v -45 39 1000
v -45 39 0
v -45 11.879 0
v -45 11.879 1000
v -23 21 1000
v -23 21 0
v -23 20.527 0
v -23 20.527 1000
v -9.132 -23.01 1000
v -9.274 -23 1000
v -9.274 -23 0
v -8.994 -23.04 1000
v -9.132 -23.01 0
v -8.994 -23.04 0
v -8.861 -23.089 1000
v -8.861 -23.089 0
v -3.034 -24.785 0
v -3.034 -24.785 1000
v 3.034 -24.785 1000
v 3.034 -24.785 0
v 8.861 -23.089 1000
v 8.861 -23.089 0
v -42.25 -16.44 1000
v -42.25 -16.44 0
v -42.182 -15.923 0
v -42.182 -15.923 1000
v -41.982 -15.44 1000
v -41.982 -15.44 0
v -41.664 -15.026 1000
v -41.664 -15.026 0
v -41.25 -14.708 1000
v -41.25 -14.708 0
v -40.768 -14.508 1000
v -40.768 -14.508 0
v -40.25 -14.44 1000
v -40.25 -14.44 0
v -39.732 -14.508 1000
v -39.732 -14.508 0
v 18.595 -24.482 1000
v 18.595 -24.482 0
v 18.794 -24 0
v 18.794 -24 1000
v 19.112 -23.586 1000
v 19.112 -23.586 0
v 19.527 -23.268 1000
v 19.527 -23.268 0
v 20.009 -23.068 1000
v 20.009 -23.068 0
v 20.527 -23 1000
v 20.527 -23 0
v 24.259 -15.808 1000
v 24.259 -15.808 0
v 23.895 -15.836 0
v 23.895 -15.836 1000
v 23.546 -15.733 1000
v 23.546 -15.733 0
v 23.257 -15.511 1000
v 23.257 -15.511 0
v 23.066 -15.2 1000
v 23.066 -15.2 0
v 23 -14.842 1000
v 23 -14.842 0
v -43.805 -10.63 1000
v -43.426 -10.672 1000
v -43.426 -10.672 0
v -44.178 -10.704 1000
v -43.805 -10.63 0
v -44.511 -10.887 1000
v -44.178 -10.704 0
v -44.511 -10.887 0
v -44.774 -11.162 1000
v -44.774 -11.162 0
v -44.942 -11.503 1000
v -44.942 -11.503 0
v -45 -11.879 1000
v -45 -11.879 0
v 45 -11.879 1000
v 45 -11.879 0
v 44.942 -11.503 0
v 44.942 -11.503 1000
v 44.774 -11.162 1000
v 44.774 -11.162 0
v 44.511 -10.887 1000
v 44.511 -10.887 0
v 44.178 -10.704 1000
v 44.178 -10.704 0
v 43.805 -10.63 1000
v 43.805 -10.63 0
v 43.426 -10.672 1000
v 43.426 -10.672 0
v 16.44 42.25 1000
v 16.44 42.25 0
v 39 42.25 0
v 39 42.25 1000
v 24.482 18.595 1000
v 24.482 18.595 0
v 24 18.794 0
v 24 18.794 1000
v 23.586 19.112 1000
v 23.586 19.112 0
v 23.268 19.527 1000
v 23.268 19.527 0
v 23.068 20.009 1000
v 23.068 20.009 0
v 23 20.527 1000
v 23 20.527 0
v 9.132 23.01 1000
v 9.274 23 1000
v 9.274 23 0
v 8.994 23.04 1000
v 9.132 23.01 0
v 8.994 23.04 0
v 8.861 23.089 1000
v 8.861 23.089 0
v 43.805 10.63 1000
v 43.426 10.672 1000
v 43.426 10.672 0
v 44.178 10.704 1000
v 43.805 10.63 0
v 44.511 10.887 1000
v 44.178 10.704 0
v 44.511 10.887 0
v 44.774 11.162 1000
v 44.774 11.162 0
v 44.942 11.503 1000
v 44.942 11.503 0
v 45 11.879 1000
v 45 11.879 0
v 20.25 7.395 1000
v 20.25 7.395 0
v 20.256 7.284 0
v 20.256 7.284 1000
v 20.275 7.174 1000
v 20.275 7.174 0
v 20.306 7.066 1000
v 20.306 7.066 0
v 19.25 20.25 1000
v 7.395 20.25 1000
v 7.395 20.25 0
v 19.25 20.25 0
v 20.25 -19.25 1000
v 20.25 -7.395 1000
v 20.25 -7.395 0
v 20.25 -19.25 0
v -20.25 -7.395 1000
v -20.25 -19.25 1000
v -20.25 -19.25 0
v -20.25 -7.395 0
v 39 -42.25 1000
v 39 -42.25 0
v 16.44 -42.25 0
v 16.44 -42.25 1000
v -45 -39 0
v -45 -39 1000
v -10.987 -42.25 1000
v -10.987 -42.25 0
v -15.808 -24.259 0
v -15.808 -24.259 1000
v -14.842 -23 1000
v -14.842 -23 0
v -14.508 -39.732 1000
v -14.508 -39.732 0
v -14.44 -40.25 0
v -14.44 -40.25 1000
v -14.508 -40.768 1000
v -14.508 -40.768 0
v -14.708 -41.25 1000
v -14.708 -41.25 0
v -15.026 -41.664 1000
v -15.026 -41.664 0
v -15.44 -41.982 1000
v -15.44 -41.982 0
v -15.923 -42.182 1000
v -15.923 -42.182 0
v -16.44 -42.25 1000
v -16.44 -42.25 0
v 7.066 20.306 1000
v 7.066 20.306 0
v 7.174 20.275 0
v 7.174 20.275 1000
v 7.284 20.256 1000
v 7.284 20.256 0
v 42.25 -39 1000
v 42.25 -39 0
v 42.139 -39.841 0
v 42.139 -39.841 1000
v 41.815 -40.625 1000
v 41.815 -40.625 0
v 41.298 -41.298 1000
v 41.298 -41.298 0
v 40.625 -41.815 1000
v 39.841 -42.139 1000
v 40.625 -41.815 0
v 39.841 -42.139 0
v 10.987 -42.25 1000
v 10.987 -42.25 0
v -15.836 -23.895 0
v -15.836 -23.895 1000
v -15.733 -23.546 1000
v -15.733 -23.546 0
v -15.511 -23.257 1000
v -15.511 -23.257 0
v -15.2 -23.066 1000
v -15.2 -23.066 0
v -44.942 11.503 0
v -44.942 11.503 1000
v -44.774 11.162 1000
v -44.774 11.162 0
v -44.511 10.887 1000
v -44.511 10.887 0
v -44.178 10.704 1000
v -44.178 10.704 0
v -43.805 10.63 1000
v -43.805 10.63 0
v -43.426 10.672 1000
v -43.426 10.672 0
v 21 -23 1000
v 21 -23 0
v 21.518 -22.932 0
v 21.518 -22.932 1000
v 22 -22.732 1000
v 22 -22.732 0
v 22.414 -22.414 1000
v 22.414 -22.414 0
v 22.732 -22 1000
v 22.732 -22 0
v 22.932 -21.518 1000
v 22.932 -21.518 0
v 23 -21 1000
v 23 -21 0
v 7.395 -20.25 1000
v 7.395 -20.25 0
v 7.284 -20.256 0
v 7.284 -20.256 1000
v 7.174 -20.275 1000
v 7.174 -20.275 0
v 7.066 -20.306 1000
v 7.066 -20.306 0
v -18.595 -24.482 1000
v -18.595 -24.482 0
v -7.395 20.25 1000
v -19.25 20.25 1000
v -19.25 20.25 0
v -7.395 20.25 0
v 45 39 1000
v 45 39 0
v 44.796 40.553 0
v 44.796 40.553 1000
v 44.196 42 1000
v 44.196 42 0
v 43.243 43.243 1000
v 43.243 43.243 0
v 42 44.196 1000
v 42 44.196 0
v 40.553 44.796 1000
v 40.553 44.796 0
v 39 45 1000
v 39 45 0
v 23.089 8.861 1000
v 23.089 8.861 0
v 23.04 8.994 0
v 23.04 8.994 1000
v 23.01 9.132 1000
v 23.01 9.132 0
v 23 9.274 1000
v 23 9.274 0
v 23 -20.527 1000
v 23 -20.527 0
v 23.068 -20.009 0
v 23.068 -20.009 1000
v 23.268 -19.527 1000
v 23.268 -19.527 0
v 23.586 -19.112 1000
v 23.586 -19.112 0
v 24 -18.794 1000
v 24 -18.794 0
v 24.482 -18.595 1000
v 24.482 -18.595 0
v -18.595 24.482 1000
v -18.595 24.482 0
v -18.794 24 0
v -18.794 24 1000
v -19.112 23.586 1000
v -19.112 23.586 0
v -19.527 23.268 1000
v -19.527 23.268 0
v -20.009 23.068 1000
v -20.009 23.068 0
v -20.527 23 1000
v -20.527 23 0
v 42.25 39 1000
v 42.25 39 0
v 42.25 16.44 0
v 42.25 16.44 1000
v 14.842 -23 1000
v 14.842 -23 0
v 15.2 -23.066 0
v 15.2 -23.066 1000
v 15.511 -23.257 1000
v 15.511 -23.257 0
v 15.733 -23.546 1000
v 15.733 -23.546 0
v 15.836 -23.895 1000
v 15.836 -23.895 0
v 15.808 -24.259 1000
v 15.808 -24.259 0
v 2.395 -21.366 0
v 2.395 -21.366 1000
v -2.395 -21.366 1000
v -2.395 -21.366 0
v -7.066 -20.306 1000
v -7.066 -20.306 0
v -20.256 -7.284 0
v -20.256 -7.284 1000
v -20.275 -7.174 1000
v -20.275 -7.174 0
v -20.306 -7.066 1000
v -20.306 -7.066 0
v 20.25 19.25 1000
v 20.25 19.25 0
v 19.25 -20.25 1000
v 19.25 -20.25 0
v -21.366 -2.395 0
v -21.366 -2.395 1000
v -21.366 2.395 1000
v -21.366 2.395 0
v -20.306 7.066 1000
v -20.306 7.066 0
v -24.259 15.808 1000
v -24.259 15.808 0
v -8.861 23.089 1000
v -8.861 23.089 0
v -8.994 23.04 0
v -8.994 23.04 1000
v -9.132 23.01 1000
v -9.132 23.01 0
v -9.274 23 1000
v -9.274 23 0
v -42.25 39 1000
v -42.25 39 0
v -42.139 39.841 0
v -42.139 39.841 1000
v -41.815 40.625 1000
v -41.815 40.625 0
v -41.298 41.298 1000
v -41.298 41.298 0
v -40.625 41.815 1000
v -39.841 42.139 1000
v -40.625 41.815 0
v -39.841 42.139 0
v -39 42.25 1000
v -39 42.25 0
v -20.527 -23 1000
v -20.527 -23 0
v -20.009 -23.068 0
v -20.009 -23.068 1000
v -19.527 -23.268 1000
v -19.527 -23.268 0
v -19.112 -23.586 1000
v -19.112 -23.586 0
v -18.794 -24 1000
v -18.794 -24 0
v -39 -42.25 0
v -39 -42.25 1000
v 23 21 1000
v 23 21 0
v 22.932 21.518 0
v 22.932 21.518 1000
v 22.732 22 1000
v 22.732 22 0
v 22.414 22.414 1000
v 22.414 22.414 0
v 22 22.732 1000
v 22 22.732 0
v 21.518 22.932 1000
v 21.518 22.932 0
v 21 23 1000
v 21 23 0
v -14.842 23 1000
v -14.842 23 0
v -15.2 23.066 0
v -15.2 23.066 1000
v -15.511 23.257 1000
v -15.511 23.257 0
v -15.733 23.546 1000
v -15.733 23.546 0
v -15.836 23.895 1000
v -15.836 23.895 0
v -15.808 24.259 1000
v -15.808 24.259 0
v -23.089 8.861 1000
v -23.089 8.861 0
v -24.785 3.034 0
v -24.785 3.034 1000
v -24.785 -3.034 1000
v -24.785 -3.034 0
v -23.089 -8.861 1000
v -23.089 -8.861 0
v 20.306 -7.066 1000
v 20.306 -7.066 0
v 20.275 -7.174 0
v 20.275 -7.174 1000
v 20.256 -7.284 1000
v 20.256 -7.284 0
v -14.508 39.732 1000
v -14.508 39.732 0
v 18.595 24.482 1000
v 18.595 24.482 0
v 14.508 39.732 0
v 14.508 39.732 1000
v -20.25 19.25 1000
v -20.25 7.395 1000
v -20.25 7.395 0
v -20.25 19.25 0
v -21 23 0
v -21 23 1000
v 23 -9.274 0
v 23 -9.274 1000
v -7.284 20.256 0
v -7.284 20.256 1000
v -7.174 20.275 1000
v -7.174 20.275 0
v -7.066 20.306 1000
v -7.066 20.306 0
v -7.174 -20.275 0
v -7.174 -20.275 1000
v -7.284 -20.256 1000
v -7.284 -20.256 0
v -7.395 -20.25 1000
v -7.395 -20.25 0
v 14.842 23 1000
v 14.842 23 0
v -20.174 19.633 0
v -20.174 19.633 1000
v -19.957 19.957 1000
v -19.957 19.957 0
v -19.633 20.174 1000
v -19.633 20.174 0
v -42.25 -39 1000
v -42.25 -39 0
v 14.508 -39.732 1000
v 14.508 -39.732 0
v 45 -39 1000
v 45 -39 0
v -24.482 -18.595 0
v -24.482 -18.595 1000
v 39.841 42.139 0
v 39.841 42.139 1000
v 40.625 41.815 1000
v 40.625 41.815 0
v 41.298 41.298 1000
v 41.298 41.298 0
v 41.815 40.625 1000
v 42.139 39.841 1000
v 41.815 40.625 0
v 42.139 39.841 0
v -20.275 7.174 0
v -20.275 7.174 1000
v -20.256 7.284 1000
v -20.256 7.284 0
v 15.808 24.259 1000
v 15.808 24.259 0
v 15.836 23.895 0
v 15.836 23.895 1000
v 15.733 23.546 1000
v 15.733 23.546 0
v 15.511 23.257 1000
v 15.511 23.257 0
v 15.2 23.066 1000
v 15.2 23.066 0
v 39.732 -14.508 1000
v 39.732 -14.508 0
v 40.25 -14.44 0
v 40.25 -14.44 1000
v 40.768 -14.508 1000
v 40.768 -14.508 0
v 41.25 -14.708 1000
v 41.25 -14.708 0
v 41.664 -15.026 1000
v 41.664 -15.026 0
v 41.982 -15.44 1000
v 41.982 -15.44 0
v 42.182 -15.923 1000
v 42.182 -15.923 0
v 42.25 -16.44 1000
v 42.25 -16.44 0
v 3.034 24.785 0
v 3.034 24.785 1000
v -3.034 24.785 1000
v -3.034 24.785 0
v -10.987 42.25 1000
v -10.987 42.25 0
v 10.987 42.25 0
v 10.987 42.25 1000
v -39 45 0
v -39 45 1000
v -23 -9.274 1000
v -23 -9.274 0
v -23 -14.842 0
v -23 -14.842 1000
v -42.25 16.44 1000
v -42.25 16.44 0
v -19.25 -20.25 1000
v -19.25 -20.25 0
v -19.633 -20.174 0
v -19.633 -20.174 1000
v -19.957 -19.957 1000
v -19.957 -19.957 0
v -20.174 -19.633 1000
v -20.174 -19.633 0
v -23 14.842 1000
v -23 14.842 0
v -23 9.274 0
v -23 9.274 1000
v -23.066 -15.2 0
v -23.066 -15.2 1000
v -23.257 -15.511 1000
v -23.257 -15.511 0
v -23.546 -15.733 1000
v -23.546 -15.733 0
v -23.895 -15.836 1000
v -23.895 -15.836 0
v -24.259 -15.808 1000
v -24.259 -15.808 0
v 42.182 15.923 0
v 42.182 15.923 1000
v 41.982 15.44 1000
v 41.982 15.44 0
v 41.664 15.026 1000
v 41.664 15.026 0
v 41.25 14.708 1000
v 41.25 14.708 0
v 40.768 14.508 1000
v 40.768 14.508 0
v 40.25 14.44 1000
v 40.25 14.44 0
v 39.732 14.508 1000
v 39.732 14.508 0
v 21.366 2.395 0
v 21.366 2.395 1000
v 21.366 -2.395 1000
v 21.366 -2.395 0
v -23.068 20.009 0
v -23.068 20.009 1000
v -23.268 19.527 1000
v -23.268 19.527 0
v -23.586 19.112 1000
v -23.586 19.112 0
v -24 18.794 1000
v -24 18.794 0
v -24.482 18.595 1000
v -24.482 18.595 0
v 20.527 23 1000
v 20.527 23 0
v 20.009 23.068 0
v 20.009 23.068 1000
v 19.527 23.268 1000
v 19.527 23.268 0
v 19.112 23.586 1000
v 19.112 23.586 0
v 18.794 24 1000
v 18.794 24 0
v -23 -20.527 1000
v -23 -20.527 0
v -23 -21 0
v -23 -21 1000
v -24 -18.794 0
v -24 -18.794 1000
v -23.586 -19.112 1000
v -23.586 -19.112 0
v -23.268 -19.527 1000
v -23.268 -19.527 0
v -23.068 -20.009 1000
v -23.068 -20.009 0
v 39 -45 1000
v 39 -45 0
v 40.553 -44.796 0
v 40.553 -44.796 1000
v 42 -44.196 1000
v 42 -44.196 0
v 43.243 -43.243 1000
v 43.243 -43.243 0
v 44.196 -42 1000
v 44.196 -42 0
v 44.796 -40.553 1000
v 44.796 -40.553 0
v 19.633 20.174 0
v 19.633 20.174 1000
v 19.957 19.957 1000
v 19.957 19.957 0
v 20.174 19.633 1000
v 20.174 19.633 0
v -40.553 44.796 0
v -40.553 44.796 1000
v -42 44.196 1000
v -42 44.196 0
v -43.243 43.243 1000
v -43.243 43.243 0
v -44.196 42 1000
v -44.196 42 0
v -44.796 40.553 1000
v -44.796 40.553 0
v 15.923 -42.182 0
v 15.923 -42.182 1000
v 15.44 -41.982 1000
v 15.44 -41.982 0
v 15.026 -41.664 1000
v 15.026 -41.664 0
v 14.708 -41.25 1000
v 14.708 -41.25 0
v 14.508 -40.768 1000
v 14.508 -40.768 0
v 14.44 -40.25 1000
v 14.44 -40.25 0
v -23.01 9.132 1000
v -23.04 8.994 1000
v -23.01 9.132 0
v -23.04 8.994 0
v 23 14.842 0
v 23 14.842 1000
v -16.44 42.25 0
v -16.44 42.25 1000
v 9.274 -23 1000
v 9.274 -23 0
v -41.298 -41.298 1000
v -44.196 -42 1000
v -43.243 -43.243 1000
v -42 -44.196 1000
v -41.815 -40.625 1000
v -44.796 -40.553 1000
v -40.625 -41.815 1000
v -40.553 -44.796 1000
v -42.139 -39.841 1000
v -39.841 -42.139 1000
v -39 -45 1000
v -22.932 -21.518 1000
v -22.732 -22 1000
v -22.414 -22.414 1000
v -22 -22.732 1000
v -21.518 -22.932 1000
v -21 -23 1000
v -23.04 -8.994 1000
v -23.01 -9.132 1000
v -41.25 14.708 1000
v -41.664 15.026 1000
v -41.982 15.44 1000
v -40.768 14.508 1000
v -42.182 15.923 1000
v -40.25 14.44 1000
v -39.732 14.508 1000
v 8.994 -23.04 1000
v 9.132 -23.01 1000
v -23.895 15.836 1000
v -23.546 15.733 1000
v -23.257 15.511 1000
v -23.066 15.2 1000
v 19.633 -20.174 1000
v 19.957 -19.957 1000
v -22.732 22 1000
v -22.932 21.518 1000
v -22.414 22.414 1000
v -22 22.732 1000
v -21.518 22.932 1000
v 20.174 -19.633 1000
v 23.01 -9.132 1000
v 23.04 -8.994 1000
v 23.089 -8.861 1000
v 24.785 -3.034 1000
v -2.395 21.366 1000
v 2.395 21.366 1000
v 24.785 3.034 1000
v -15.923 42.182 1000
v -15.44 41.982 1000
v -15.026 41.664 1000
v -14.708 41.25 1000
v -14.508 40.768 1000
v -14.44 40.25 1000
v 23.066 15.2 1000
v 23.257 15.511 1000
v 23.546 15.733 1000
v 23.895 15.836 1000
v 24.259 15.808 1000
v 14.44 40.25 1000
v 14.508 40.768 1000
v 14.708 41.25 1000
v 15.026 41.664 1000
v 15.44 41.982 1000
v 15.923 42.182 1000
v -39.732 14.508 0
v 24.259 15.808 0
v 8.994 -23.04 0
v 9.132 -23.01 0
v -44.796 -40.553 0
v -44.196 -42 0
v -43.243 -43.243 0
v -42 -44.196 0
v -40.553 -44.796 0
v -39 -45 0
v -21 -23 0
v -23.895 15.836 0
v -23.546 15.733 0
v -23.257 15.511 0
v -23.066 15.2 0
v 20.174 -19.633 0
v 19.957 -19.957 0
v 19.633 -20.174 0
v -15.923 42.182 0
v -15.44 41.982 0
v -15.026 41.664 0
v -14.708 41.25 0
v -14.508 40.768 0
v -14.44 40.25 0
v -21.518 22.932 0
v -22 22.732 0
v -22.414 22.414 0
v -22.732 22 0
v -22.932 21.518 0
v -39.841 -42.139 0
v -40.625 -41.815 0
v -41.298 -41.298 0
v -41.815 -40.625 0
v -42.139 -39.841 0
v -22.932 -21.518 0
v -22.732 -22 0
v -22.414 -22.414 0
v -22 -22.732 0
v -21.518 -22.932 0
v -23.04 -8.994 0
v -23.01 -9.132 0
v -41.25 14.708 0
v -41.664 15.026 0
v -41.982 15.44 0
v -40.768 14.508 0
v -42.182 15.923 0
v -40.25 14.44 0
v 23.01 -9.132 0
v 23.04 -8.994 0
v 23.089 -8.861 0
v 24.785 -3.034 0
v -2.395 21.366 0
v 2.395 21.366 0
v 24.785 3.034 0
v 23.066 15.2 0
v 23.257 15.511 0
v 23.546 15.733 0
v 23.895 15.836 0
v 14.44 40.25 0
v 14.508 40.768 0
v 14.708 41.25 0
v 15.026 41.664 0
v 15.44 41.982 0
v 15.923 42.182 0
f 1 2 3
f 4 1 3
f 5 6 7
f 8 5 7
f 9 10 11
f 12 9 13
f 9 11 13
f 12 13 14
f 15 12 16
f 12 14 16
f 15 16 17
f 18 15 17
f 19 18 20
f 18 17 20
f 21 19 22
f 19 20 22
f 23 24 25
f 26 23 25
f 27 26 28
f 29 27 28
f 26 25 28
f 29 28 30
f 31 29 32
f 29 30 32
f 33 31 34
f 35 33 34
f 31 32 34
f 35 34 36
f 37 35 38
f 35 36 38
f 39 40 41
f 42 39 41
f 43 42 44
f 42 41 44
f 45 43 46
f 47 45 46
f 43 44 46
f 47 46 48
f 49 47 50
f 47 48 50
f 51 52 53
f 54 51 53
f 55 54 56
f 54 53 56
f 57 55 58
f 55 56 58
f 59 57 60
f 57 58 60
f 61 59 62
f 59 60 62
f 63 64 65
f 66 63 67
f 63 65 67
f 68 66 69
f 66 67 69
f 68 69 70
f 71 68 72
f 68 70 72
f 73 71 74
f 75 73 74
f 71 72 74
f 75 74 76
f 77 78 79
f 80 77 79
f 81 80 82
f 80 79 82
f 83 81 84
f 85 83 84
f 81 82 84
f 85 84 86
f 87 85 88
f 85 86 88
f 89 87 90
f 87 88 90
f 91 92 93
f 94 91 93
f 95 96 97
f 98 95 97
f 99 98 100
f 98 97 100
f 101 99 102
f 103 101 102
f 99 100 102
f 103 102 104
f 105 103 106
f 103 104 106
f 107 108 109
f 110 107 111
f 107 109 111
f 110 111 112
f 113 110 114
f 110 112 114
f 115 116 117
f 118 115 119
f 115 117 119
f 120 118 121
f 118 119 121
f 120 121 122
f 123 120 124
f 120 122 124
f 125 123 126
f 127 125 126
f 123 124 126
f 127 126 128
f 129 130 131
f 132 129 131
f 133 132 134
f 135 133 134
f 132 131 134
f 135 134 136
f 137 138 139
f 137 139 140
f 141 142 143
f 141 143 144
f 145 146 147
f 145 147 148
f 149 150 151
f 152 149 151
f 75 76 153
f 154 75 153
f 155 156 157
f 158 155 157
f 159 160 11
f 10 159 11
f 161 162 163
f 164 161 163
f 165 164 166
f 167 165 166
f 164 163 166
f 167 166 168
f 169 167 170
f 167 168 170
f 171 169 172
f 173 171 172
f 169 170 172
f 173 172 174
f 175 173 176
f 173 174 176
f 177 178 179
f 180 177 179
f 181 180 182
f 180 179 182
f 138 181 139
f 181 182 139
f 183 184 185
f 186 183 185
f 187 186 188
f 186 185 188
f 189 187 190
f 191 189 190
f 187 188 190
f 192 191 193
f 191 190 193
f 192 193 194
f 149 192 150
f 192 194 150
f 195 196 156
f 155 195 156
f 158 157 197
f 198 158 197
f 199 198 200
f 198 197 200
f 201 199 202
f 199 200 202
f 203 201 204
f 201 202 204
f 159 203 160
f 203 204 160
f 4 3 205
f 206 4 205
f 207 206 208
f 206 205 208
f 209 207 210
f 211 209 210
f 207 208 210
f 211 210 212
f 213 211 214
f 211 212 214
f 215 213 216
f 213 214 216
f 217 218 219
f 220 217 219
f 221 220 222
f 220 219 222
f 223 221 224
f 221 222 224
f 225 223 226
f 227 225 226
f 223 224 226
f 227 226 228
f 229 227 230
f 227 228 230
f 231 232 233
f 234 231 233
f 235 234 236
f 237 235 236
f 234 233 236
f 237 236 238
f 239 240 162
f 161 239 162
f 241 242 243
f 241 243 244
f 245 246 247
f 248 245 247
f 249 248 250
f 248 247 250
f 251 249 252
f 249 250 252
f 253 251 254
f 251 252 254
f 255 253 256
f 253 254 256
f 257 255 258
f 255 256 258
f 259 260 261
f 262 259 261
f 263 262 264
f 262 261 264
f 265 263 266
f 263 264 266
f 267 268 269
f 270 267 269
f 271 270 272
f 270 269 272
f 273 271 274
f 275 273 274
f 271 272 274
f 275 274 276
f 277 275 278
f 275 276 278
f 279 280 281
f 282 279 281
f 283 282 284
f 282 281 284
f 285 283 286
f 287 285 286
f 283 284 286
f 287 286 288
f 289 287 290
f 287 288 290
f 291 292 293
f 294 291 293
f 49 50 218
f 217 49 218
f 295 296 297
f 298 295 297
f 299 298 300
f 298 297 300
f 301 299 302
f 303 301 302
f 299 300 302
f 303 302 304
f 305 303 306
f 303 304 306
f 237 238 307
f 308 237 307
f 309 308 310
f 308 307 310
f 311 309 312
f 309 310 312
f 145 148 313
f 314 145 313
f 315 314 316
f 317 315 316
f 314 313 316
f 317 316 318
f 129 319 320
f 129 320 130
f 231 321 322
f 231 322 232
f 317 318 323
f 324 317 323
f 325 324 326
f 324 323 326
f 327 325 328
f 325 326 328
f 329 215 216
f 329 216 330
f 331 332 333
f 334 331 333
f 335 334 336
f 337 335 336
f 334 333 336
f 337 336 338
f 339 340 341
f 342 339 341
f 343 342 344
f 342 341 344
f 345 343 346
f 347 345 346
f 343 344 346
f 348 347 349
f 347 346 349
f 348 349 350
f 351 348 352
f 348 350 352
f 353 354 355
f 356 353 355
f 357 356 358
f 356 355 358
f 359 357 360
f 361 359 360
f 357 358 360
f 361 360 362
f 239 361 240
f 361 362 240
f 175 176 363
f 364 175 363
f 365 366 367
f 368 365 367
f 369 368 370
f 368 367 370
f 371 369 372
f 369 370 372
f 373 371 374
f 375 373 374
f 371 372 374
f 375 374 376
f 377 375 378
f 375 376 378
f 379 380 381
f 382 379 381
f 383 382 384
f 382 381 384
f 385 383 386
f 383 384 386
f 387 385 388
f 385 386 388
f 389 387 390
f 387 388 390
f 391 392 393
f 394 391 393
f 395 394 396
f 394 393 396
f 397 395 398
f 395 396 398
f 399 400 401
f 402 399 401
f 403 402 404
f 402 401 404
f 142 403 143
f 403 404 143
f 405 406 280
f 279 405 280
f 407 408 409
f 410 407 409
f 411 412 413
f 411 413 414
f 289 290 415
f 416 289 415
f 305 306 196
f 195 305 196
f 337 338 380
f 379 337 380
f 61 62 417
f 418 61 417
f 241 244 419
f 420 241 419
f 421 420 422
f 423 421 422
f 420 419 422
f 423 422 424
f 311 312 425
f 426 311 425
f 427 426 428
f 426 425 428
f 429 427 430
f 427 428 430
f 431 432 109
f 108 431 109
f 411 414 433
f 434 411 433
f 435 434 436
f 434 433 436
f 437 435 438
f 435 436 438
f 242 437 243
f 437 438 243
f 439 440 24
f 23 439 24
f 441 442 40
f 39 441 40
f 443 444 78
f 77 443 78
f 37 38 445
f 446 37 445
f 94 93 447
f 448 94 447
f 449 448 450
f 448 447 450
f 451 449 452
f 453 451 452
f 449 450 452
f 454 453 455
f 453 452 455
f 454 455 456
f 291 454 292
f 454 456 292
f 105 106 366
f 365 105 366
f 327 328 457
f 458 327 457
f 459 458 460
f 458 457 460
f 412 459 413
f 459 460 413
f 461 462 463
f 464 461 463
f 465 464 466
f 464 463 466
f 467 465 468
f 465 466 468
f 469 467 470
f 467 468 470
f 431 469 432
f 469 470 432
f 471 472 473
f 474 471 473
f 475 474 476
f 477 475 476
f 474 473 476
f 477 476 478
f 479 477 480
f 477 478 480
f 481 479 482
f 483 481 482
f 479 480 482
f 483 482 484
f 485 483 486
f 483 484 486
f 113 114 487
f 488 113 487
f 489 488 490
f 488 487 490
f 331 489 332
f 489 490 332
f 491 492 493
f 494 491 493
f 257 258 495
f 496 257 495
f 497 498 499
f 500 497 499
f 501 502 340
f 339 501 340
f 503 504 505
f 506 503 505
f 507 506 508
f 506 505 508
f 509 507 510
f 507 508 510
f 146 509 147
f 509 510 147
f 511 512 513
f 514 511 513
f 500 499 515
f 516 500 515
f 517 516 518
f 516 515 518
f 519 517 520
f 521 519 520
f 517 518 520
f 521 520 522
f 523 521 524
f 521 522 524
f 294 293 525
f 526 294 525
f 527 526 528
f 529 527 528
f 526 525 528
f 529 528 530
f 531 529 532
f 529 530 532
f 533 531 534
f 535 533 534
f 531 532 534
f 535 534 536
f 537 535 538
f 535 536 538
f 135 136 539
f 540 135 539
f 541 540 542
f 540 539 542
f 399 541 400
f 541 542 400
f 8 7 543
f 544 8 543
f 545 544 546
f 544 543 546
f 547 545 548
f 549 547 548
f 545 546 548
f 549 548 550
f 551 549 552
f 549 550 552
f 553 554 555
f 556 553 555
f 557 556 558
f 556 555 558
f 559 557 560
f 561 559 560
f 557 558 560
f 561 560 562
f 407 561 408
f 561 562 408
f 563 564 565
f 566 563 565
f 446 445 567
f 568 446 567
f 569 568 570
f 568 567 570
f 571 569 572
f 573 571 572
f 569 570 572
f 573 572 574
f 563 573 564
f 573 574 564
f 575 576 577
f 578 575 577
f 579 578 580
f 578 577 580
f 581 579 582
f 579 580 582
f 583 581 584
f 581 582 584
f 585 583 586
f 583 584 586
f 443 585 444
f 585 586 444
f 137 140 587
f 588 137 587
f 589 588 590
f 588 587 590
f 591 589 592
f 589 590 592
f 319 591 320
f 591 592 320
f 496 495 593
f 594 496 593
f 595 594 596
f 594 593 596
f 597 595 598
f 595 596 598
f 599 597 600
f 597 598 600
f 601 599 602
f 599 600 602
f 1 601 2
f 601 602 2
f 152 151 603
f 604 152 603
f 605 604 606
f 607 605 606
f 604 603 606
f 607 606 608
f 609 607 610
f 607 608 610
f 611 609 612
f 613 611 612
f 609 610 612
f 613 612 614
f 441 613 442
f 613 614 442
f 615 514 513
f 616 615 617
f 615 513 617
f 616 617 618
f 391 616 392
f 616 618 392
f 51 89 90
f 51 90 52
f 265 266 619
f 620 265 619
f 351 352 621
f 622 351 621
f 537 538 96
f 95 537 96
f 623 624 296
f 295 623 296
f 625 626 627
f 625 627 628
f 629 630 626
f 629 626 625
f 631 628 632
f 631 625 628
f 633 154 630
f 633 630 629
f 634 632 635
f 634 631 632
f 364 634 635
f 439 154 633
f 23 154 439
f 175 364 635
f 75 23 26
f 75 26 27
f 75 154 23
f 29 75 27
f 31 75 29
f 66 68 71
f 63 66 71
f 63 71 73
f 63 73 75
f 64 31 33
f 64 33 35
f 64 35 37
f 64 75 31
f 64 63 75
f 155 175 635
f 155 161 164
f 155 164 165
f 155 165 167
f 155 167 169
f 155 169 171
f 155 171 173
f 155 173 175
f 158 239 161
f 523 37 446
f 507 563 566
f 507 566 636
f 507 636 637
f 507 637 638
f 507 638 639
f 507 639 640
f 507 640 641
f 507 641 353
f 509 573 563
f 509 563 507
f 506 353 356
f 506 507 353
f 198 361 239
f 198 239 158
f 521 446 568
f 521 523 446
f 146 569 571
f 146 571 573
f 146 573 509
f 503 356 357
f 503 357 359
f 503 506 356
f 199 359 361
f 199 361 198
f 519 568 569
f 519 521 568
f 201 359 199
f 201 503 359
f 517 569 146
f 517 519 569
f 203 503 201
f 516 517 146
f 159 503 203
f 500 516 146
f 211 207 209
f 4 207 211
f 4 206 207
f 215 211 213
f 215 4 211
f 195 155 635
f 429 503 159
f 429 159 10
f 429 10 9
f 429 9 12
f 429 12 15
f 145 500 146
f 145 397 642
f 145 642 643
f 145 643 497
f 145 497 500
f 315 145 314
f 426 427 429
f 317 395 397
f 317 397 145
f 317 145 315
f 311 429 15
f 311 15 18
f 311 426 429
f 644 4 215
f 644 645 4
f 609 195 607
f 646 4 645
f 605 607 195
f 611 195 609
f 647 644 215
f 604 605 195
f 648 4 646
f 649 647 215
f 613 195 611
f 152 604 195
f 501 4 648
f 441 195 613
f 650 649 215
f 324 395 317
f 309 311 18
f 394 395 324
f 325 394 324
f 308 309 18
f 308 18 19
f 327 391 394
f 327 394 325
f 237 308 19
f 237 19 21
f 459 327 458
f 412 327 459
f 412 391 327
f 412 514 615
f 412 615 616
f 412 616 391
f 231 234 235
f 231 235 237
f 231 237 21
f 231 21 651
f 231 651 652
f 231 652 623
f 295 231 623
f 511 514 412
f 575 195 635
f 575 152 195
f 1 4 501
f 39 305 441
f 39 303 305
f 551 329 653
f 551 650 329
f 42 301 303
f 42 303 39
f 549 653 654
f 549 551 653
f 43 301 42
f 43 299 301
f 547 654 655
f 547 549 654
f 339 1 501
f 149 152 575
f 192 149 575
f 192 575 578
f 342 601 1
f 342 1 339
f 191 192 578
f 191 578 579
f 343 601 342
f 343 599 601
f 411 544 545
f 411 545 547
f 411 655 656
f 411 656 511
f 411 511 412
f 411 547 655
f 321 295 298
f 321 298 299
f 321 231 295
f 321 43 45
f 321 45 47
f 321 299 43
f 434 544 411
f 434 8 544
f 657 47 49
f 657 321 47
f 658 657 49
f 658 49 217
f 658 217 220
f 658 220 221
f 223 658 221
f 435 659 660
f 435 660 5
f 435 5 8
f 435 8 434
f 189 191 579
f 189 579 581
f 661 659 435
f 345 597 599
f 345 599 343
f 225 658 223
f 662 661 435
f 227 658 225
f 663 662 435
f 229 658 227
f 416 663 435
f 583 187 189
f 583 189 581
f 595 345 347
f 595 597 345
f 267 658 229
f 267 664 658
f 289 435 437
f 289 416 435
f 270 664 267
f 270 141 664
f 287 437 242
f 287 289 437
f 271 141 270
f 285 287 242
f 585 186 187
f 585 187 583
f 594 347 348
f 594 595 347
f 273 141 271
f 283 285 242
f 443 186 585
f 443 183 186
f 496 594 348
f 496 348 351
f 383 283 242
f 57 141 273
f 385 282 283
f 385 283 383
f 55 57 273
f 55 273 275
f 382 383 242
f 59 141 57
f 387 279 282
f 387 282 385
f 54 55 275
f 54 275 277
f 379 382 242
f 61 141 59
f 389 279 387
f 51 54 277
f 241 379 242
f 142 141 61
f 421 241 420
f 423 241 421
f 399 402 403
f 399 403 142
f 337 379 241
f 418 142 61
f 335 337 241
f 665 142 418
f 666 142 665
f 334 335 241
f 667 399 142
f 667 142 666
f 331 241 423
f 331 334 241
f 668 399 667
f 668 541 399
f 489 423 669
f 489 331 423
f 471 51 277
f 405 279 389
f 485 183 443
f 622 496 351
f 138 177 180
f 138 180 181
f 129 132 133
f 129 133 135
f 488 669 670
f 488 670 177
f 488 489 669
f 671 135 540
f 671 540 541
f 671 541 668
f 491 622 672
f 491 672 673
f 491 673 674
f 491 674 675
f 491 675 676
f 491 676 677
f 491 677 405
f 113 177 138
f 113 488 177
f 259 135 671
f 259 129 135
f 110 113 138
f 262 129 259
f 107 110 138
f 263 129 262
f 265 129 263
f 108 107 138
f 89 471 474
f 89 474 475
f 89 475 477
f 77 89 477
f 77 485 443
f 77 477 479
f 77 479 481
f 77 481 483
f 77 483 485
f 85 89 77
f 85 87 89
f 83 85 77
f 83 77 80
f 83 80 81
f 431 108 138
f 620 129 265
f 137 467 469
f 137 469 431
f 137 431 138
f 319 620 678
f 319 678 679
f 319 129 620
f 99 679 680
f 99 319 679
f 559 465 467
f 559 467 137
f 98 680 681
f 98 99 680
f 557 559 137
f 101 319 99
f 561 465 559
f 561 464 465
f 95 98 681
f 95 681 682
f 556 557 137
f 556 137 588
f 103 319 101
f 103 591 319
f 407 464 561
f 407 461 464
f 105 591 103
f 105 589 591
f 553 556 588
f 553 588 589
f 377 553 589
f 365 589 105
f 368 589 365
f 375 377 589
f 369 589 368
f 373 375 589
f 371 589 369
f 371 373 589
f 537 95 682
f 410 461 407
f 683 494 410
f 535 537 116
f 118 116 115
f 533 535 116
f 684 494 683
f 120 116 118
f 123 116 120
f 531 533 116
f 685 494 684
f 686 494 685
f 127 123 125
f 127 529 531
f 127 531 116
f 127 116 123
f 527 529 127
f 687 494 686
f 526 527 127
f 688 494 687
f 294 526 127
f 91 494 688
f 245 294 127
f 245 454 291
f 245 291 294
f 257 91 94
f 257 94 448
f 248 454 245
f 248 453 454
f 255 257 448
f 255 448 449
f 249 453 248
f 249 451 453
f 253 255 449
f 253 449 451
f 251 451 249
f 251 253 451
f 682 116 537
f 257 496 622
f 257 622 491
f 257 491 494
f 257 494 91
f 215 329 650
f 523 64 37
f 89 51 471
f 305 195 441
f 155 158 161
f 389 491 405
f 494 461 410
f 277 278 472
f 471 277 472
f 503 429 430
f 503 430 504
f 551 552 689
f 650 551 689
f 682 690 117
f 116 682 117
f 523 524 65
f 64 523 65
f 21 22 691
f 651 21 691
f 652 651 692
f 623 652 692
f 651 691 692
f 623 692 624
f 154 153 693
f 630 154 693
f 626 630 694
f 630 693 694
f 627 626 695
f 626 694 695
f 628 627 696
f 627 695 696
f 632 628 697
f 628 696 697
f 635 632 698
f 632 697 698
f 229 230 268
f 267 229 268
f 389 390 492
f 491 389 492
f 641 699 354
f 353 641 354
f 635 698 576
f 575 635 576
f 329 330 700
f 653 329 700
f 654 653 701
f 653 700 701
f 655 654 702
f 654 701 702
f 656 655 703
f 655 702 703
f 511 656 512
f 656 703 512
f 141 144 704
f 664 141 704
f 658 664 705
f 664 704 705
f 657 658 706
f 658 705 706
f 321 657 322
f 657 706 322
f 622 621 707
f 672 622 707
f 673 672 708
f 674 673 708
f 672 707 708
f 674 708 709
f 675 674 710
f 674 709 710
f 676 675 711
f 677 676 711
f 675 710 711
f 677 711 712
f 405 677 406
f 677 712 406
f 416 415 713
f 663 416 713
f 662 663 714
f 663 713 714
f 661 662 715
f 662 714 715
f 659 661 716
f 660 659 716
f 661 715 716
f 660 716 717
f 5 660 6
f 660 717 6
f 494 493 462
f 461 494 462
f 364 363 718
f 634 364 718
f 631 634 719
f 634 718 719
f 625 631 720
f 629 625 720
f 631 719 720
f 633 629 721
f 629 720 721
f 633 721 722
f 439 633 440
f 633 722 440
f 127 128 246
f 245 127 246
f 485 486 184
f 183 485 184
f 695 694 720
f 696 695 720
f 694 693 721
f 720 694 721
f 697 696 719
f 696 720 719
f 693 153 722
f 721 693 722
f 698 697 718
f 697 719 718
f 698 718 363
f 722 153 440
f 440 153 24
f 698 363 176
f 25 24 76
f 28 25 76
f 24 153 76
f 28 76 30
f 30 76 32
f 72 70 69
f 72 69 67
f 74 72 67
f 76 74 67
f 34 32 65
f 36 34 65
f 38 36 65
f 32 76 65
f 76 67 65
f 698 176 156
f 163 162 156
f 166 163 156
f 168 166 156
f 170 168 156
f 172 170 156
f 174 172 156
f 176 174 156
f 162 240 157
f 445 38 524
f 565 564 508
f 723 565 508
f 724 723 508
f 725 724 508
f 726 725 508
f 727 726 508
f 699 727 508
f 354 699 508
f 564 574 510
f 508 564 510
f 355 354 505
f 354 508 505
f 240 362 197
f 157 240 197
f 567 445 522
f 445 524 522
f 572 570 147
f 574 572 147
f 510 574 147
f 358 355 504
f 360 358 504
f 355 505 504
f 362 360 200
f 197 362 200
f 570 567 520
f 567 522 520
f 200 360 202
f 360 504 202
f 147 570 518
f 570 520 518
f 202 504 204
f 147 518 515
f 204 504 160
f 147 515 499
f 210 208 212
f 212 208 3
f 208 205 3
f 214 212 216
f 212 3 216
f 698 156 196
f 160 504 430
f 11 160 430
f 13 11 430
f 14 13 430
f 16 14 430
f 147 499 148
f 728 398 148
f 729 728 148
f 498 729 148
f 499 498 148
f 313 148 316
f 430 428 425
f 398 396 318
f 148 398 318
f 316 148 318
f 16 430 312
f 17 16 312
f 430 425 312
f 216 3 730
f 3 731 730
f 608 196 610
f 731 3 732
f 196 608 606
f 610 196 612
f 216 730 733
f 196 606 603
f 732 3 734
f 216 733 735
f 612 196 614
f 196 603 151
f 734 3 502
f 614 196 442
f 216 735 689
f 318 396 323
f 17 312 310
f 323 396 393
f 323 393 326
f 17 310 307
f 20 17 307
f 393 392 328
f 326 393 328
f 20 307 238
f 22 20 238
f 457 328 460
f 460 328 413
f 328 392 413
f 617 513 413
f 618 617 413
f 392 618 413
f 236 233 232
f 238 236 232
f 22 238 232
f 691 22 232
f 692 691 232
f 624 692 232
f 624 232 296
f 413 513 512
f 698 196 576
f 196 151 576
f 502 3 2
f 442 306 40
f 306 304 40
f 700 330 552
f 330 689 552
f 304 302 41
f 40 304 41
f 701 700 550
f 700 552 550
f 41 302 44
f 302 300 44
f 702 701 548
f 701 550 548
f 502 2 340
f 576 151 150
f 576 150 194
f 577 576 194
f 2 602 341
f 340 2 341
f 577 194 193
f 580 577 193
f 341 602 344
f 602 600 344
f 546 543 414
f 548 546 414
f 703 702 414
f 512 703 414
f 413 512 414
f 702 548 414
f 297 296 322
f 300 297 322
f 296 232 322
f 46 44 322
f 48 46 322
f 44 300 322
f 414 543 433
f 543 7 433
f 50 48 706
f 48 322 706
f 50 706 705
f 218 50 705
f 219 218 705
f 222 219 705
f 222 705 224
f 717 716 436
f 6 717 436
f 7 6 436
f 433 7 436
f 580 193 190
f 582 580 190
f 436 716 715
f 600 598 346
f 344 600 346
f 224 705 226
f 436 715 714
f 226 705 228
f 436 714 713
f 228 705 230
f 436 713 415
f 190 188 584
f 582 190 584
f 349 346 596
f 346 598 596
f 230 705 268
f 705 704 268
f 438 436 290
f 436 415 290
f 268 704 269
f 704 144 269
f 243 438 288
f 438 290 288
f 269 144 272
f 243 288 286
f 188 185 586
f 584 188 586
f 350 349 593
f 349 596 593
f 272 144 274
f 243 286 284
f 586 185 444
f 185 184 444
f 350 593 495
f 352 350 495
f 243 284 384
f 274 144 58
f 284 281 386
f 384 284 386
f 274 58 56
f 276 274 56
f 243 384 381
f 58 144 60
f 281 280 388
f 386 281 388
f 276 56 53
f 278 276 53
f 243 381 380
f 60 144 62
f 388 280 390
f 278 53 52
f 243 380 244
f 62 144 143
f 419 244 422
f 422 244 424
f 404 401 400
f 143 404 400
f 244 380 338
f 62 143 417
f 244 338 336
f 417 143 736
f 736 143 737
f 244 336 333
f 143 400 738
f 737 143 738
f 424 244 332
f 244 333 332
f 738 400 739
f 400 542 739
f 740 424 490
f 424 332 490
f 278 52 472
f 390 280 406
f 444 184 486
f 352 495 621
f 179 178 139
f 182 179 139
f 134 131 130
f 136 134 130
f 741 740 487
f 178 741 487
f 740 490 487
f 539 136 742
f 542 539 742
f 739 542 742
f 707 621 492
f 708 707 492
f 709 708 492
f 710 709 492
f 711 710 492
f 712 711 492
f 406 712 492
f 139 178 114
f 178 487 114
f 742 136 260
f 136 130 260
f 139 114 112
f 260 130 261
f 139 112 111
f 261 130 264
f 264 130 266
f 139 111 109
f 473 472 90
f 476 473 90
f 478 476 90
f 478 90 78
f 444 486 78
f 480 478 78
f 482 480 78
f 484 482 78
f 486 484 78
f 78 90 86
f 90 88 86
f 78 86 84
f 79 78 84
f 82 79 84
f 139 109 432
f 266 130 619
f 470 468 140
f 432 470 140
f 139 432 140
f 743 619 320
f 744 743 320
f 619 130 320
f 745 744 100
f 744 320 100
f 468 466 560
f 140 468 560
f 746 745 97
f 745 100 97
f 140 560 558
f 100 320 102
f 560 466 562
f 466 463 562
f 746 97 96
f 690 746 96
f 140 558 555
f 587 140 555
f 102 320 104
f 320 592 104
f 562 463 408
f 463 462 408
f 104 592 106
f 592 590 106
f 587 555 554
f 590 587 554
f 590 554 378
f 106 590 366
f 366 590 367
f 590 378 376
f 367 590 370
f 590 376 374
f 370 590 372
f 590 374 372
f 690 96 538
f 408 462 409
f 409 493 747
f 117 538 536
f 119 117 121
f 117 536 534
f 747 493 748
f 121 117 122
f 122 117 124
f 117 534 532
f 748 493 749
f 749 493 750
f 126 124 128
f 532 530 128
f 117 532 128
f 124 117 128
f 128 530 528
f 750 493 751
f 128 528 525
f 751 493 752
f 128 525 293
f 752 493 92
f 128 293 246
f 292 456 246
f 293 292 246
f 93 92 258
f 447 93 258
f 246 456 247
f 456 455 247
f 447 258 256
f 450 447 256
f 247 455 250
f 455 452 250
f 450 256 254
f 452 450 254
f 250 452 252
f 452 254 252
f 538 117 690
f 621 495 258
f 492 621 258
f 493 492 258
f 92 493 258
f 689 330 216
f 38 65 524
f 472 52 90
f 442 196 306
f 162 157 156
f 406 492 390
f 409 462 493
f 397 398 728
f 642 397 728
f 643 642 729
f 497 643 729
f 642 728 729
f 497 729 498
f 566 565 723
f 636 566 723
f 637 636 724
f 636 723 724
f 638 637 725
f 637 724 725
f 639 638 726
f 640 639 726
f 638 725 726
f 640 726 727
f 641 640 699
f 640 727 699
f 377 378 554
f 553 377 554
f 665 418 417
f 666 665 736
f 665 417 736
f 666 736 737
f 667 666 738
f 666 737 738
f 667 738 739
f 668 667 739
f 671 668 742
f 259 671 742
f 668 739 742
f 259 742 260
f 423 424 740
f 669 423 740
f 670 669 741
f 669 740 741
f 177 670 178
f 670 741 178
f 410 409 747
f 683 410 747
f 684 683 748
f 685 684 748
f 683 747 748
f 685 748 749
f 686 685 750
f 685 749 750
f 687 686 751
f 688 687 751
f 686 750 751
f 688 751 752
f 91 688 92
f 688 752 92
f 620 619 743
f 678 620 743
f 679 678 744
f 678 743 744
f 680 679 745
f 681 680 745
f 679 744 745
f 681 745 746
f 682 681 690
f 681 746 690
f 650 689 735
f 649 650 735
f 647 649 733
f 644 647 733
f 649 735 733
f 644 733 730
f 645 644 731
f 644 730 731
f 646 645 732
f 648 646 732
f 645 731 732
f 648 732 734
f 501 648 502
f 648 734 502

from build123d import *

# Parameters (mm, degrees)
F1_DEPTH = 1000


# Not quite as in the source:
# - ends of sketch curves that miss each other by under 0.0002 mm in the source are joined


with BuildPart() as f1:
    # F0 (on Top) → F1 (new body)
    with BuildSketch(Plane.XY):
        with BuildLine():
            ThreePointArc((23.0888885991, 8.8614578186), (23.022474706, 9.062799833), (23, 9.273618))
            Line((23, 9.273618), (23, 14.841657))
            ThreePointArc((23, 14.841657), (23.3912385359, 15.6350103133), (24.2588189596, 15.8075828492))
            Line((24.2588189596, 15.8075828492), (43.426476, 10.671624))
            ThreePointArc((43.426476, 10.671624), (44.5109517857, 10.8873403242), (45, 11.879032))
            Line((45, 11.879032), (45, 39))
            ThreePointArc((45, 39), (43.2426406871, 43.2426406871), (39, 45))
            Line((39, 45), (-39, 45))
            ThreePointArc((-39, 45), (-43.2426406871, 43.2426406871), (-45, 39))
            Line((-45, 39), (-45, 11.879032))
            ThreePointArc((-45, 11.879032), (-44.5109517857, 10.8873403242), (-43.4264761923, 10.6716247175))
            Line((-43.4264761923, 10.6716247175), (-24.258819, 15.807583))
            ThreePointArc((-24.258819, 15.807583), (-23.3912385359, 15.6350103133), (-23, 14.841657))
            Line((-23, 14.841657), (-23, 9.273618))
            ThreePointArc((-23, 9.273618), (-23.022474706, 9.062799833), (-23.0888885991, 8.8614578186))
            ThreePointArc((-23.0888885991, 8.8614578186), (-25, 0), (-23.0888887851, -8.8614579028))
            ThreePointArc((-23.0888887851, -8.8614579028), (-23.022474706, -9.062799833), (-23, -9.273618))
            Line((-23, -9.273618), (-23, -14.841657))
            ThreePointArc((-23, -14.841657), (-23.3912385359, -15.6350103133), (-24.2588189596, -15.8075828492))
            Line((-24.2588189596, -15.8075828492), (-43.426476, -10.671624))
            ThreePointArc((-43.426476, -10.671624), (-44.5109517857, -10.8873403242), (-45, -11.879032))
            Line((-45, -11.879032), (-45, -39))
            ThreePointArc((-45, -39), (-43.2426406871, -43.2426406871), (-39, -45))
            Line((-39, -45), (39, -45))
            ThreePointArc((39, -45), (43.2426406871, -43.2426406871), (45, -39))
            Line((45, -39), (45, -11.879032))
            ThreePointArc((45, -11.879032), (44.5109517857, -10.8873403242), (43.4264761923, -10.6716247175))
            Line((43.4264761923, -10.6716247175), (24.258819, -15.807583))
            ThreePointArc((24.258819, -15.807583), (23.3912385359, -15.6350103133), (23, -14.841657))
            Line((23, -14.841657), (23, -9.273618))
            ThreePointArc((23, -9.273618), (23.022474706, -9.062799833), (23.0888885991, -8.8614578186))
            ThreePointArc((23.0888885991, -8.8614578186), (25, 0), (23.0888885991, 8.8614578186))
        make_face()
        with BuildLine():
            Line((-14.841657, -23), (-9.273618, -23))
            ThreePointArc((-9.273618, -23), (-9.062799833, -23.022474706), (-8.8614578186, -23.0888885991))
            ThreePointArc((-8.8614578186, -23.0888885991), (0, -25), (8.8614579028, -23.0888887851))
            ThreePointArc((8.8614579028, -23.0888887851), (9.062799833, -23.022474706), (9.273618, -23))
            Line((9.273618, -23), (14.841657, -23))
            ThreePointArc((14.841657, -23), (15.6350103133, -23.3912385359), (15.8075828492, -24.2588189596))
            Line((15.8075828492, -24.2588189596), (10.98686, -42.25))
            Line((10.98686, -42.25), (-10.98686, -42.25))
            Line((-10.98686, -42.25), (-15.807583, -24.258819))
            ThreePointArc((-15.807583, -24.258819), (-15.6350103133, -23.3912385359), (-14.841657, -23))
        make_face(mode=Mode.SUBTRACT)
        with BuildLine():
            Line((-39.732362, -14.508469), (-24.482362, -18.594694))
            ThreePointArc((-24.482362, -18.594694), (-23.4132933733, -19.3090230718), (-23, -20.526546))
            Line((-23, -20.526546), (-23, -21))
            ThreePointArc((-23, -21), (-22.4142135624, -22.4142135624), (-21, -23))
            Line((-21, -23), (-20.526546, -23))
            ThreePointArc((-20.526546, -23), (-19.3090230718, -23.4132933733), (-18.5946943016, -24.4823620808))
            Line((-18.5946943016, -24.4823620808), (-14.508469, -39.732362))
            ThreePointArc((-14.508469, -39.732362), (-14.8536143733, -41.4675229282), (-16.440321, -42.25))
            Line((-16.440321, -42.25), (-39, -42.25))
            ThreePointArc((-39, -42.25), (-41.2980970389, -41.2980970389), (-42.25, -39))
            Line((-42.25, -39), (-42.25, -16.440321))
            ThreePointArc((-42.25, -16.440321), (-41.4675229282, -14.8536143733), (-39.732362, -14.508469))
        make_face(mode=Mode.SUBTRACT)
        with BuildLine():
            Line((14.508469, -39.732362), (18.594694, -24.482362))
            ThreePointArc((18.594694, -24.482362), (19.3090230718, -23.4132933733), (20.526546, -23))
            Line((20.526546, -23), (21, -23))
            ThreePointArc((21, -23), (22.4142135624, -22.4142135624), (23, -21))
            Line((23, -21), (23, -20.526546))
            ThreePointArc((23, -20.526546), (23.4132933733, -19.3090230718), (24.4823620808, -18.5946943016))
            Line((24.4823620808, -18.5946943016), (39.732362, -14.508469))
            ThreePointArc((39.732362, -14.508469), (41.4675229282, -14.8536143733), (42.25, -16.440321))
            Line((42.25, -16.440321), (42.25, -39))
            ThreePointArc((42.25, -39), (41.2980970389, -41.2980970389), (39, -42.25))
            Line((39, -42.25), (16.440321, -42.25))
            ThreePointArc((16.440321, -42.25), (14.8536143733, -41.4675229282), (14.508469, -39.732362))
        make_face(mode=Mode.SUBTRACT)
        with BuildLine():
            Line((-7.3951, -20.25), (-19.25, -20.25))
            ThreePointArc((-19.25, -20.25), (-19.9571067812, -19.9571067812), (-20.25, -19.25))
            Line((-20.25, -19.25), (-20.25, -7.3951))
            ThreePointArc((-20.25, -7.3951), (-20.2639867072, -7.2284333074), (-20.3055555728, -7.0664288513))
            ThreePointArc((-20.3055554887, -7.066428822), (-21.5, 0), (-20.3055554887, 7.066428822))
            ThreePointArc((-20.3055555728, 7.0664288513), (-20.2639867072, 7.2284333074), (-20.25, 7.3951))
            Line((-20.25, 7.3951), (-20.25, 19.25))
            ThreePointArc((-20.25, 19.25), (-19.9571067812, 19.9571067812), (-19.25, 20.25))
            Line((-19.25, 20.25), (-7.3951, 20.25))
            ThreePointArc((-7.3951, 20.25), (-7.2284333074, 20.2639867072), (-7.0664288513, 20.3055555728))
            ThreePointArc((-7.066428822, 20.3055554887), (0, 21.5), (7.066428822, 20.3055554887))
            ThreePointArc((7.0664288513, 20.3055555728), (7.2284333074, 20.2639867072), (7.3951, 20.25))
            Line((7.3951, 20.25), (19.25, 20.25))
            ThreePointArc((19.25, 20.25), (19.9571067812, 19.9571067812), (20.25, 19.25))
            Line((20.25, 19.25), (20.25, 7.3951))
            ThreePointArc((20.25, 7.3951), (20.2639867072, 7.2284333074), (20.3055555728, 7.0664288513))
            ThreePointArc((20.3055554887, 7.066428822), (21.5, 0), (20.3055554887, -7.066428822))
            ThreePointArc((20.3055555728, -7.0664288513), (20.2639867072, -7.2284333074), (20.25, -7.3951))
            Line((20.25, -7.3951), (20.25, -19.25))
            ThreePointArc((20.25, -19.25), (19.9571067812, -19.9571067812), (19.25, -20.25))
            Line((19.25, -20.25), (7.3951, -20.25))
            ThreePointArc((7.3951, -20.25), (7.2284333074, -20.2639867072), (7.0664288513, -20.3055555728))
            ThreePointArc((7.066428822, -20.3055554887), (0, -21.5), (-7.066428822, -20.3055554887))
            ThreePointArc((-7.0664288513, -20.3055555728), (-7.2284333074, -20.2639867072), (-7.3951, -20.25))
        make_face(mode=Mode.SUBTRACT)
        with BuildLine():
            Line((-14.508469, 39.732362), (-18.594694, 24.482362))
            ThreePointArc((-18.594694, 24.482362), (-19.3090230718, 23.4132933733), (-20.526546, 23))
            Line((-20.526546, 23), (-21, 23))
            ThreePointArc((-21, 23), (-22.4142135624, 22.4142135624), (-23, 21))
            Line((-23, 21), (-23, 20.526546))
            ThreePointArc((-23, 20.526546), (-23.4132933733, 19.3090230718), (-24.4823620808, 18.5946943016))
            Line((-24.4823620808, 18.5946943016), (-39.732362, 14.508469))
            ThreePointArc((-39.732362, 14.508469), (-41.4675229282, 14.8536143733), (-42.25, 16.440321))
            Line((-42.25, 16.440321), (-42.25, 39))
            ThreePointArc((-42.25, 39), (-41.2980970389, 41.2980970389), (-39, 42.25))
            Line((-39, 42.25), (-16.440321, 42.25))
            ThreePointArc((-16.440321, 42.25), (-14.8536143733, 41.4675229282), (-14.508469, 39.732362))
        make_face(mode=Mode.SUBTRACT)
        with BuildLine():
            Line((-15.807583, 24.258819), (-10.98686, 42.25))
            Line((-10.98686, 42.25), (10.98686, 42.25))
            Line((10.98686, 42.25), (15.807583, 24.258819))
            ThreePointArc((15.807583, 24.258819), (15.6350103133, 23.3912385359), (14.841657, 23))
            Line((14.841657, 23), (9.273618, 23))
            ThreePointArc((9.273618, 23), (9.062799833, 23.022474706), (8.8614578186, 23.0888885991))
            ThreePointArc((8.8614578186, 23.0888885991), (0, 25), (-8.8614579028, 23.0888887851))
            ThreePointArc((-8.8614579028, 23.0888887851), (-9.062799833, 23.022474706), (-9.273618, 23))
            Line((-9.273618, 23), (-14.841657, 23))
            ThreePointArc((-14.841657, 23), (-15.6350103133, 23.3912385359), (-15.807583, 24.258819))
        make_face(mode=Mode.SUBTRACT)
        with BuildLine():
            Line((39.732362, 14.508469), (24.482362, 18.594694))
            ThreePointArc((24.482362, 18.594694), (23.4132933733, 19.3090230718), (23, 20.526546))
            Line((23, 20.526546), (23, 21))
            ThreePointArc((23, 21), (22.4142135624, 22.4142135624), (21, 23))
            Line((21, 23), (20.526546, 23))
            ThreePointArc((20.526546, 23), (19.3090230718, 23.4132933733), (18.5946943016, 24.4823620808))
            Line((18.5946943016, 24.4823620808), (14.508469, 39.732362))
            ThreePointArc((14.508469, 39.732362), (14.8536143733, 41.4675229282), (16.440321, 42.25))
            Line((16.440321, 42.25), (39, 42.25))
            ThreePointArc((39, 42.25), (41.2980970389, 41.2980970389), (42.25, 39))
            Line((42.25, 39), (42.25, 16.440321))
            ThreePointArc((42.25, 16.440321), (41.4675229282, 14.8536143733), (39.732362, 14.508469))
        make_face(mode=Mode.SUBTRACT)
    extrude(amount=F1_DEPTH)


solid = f1.part
